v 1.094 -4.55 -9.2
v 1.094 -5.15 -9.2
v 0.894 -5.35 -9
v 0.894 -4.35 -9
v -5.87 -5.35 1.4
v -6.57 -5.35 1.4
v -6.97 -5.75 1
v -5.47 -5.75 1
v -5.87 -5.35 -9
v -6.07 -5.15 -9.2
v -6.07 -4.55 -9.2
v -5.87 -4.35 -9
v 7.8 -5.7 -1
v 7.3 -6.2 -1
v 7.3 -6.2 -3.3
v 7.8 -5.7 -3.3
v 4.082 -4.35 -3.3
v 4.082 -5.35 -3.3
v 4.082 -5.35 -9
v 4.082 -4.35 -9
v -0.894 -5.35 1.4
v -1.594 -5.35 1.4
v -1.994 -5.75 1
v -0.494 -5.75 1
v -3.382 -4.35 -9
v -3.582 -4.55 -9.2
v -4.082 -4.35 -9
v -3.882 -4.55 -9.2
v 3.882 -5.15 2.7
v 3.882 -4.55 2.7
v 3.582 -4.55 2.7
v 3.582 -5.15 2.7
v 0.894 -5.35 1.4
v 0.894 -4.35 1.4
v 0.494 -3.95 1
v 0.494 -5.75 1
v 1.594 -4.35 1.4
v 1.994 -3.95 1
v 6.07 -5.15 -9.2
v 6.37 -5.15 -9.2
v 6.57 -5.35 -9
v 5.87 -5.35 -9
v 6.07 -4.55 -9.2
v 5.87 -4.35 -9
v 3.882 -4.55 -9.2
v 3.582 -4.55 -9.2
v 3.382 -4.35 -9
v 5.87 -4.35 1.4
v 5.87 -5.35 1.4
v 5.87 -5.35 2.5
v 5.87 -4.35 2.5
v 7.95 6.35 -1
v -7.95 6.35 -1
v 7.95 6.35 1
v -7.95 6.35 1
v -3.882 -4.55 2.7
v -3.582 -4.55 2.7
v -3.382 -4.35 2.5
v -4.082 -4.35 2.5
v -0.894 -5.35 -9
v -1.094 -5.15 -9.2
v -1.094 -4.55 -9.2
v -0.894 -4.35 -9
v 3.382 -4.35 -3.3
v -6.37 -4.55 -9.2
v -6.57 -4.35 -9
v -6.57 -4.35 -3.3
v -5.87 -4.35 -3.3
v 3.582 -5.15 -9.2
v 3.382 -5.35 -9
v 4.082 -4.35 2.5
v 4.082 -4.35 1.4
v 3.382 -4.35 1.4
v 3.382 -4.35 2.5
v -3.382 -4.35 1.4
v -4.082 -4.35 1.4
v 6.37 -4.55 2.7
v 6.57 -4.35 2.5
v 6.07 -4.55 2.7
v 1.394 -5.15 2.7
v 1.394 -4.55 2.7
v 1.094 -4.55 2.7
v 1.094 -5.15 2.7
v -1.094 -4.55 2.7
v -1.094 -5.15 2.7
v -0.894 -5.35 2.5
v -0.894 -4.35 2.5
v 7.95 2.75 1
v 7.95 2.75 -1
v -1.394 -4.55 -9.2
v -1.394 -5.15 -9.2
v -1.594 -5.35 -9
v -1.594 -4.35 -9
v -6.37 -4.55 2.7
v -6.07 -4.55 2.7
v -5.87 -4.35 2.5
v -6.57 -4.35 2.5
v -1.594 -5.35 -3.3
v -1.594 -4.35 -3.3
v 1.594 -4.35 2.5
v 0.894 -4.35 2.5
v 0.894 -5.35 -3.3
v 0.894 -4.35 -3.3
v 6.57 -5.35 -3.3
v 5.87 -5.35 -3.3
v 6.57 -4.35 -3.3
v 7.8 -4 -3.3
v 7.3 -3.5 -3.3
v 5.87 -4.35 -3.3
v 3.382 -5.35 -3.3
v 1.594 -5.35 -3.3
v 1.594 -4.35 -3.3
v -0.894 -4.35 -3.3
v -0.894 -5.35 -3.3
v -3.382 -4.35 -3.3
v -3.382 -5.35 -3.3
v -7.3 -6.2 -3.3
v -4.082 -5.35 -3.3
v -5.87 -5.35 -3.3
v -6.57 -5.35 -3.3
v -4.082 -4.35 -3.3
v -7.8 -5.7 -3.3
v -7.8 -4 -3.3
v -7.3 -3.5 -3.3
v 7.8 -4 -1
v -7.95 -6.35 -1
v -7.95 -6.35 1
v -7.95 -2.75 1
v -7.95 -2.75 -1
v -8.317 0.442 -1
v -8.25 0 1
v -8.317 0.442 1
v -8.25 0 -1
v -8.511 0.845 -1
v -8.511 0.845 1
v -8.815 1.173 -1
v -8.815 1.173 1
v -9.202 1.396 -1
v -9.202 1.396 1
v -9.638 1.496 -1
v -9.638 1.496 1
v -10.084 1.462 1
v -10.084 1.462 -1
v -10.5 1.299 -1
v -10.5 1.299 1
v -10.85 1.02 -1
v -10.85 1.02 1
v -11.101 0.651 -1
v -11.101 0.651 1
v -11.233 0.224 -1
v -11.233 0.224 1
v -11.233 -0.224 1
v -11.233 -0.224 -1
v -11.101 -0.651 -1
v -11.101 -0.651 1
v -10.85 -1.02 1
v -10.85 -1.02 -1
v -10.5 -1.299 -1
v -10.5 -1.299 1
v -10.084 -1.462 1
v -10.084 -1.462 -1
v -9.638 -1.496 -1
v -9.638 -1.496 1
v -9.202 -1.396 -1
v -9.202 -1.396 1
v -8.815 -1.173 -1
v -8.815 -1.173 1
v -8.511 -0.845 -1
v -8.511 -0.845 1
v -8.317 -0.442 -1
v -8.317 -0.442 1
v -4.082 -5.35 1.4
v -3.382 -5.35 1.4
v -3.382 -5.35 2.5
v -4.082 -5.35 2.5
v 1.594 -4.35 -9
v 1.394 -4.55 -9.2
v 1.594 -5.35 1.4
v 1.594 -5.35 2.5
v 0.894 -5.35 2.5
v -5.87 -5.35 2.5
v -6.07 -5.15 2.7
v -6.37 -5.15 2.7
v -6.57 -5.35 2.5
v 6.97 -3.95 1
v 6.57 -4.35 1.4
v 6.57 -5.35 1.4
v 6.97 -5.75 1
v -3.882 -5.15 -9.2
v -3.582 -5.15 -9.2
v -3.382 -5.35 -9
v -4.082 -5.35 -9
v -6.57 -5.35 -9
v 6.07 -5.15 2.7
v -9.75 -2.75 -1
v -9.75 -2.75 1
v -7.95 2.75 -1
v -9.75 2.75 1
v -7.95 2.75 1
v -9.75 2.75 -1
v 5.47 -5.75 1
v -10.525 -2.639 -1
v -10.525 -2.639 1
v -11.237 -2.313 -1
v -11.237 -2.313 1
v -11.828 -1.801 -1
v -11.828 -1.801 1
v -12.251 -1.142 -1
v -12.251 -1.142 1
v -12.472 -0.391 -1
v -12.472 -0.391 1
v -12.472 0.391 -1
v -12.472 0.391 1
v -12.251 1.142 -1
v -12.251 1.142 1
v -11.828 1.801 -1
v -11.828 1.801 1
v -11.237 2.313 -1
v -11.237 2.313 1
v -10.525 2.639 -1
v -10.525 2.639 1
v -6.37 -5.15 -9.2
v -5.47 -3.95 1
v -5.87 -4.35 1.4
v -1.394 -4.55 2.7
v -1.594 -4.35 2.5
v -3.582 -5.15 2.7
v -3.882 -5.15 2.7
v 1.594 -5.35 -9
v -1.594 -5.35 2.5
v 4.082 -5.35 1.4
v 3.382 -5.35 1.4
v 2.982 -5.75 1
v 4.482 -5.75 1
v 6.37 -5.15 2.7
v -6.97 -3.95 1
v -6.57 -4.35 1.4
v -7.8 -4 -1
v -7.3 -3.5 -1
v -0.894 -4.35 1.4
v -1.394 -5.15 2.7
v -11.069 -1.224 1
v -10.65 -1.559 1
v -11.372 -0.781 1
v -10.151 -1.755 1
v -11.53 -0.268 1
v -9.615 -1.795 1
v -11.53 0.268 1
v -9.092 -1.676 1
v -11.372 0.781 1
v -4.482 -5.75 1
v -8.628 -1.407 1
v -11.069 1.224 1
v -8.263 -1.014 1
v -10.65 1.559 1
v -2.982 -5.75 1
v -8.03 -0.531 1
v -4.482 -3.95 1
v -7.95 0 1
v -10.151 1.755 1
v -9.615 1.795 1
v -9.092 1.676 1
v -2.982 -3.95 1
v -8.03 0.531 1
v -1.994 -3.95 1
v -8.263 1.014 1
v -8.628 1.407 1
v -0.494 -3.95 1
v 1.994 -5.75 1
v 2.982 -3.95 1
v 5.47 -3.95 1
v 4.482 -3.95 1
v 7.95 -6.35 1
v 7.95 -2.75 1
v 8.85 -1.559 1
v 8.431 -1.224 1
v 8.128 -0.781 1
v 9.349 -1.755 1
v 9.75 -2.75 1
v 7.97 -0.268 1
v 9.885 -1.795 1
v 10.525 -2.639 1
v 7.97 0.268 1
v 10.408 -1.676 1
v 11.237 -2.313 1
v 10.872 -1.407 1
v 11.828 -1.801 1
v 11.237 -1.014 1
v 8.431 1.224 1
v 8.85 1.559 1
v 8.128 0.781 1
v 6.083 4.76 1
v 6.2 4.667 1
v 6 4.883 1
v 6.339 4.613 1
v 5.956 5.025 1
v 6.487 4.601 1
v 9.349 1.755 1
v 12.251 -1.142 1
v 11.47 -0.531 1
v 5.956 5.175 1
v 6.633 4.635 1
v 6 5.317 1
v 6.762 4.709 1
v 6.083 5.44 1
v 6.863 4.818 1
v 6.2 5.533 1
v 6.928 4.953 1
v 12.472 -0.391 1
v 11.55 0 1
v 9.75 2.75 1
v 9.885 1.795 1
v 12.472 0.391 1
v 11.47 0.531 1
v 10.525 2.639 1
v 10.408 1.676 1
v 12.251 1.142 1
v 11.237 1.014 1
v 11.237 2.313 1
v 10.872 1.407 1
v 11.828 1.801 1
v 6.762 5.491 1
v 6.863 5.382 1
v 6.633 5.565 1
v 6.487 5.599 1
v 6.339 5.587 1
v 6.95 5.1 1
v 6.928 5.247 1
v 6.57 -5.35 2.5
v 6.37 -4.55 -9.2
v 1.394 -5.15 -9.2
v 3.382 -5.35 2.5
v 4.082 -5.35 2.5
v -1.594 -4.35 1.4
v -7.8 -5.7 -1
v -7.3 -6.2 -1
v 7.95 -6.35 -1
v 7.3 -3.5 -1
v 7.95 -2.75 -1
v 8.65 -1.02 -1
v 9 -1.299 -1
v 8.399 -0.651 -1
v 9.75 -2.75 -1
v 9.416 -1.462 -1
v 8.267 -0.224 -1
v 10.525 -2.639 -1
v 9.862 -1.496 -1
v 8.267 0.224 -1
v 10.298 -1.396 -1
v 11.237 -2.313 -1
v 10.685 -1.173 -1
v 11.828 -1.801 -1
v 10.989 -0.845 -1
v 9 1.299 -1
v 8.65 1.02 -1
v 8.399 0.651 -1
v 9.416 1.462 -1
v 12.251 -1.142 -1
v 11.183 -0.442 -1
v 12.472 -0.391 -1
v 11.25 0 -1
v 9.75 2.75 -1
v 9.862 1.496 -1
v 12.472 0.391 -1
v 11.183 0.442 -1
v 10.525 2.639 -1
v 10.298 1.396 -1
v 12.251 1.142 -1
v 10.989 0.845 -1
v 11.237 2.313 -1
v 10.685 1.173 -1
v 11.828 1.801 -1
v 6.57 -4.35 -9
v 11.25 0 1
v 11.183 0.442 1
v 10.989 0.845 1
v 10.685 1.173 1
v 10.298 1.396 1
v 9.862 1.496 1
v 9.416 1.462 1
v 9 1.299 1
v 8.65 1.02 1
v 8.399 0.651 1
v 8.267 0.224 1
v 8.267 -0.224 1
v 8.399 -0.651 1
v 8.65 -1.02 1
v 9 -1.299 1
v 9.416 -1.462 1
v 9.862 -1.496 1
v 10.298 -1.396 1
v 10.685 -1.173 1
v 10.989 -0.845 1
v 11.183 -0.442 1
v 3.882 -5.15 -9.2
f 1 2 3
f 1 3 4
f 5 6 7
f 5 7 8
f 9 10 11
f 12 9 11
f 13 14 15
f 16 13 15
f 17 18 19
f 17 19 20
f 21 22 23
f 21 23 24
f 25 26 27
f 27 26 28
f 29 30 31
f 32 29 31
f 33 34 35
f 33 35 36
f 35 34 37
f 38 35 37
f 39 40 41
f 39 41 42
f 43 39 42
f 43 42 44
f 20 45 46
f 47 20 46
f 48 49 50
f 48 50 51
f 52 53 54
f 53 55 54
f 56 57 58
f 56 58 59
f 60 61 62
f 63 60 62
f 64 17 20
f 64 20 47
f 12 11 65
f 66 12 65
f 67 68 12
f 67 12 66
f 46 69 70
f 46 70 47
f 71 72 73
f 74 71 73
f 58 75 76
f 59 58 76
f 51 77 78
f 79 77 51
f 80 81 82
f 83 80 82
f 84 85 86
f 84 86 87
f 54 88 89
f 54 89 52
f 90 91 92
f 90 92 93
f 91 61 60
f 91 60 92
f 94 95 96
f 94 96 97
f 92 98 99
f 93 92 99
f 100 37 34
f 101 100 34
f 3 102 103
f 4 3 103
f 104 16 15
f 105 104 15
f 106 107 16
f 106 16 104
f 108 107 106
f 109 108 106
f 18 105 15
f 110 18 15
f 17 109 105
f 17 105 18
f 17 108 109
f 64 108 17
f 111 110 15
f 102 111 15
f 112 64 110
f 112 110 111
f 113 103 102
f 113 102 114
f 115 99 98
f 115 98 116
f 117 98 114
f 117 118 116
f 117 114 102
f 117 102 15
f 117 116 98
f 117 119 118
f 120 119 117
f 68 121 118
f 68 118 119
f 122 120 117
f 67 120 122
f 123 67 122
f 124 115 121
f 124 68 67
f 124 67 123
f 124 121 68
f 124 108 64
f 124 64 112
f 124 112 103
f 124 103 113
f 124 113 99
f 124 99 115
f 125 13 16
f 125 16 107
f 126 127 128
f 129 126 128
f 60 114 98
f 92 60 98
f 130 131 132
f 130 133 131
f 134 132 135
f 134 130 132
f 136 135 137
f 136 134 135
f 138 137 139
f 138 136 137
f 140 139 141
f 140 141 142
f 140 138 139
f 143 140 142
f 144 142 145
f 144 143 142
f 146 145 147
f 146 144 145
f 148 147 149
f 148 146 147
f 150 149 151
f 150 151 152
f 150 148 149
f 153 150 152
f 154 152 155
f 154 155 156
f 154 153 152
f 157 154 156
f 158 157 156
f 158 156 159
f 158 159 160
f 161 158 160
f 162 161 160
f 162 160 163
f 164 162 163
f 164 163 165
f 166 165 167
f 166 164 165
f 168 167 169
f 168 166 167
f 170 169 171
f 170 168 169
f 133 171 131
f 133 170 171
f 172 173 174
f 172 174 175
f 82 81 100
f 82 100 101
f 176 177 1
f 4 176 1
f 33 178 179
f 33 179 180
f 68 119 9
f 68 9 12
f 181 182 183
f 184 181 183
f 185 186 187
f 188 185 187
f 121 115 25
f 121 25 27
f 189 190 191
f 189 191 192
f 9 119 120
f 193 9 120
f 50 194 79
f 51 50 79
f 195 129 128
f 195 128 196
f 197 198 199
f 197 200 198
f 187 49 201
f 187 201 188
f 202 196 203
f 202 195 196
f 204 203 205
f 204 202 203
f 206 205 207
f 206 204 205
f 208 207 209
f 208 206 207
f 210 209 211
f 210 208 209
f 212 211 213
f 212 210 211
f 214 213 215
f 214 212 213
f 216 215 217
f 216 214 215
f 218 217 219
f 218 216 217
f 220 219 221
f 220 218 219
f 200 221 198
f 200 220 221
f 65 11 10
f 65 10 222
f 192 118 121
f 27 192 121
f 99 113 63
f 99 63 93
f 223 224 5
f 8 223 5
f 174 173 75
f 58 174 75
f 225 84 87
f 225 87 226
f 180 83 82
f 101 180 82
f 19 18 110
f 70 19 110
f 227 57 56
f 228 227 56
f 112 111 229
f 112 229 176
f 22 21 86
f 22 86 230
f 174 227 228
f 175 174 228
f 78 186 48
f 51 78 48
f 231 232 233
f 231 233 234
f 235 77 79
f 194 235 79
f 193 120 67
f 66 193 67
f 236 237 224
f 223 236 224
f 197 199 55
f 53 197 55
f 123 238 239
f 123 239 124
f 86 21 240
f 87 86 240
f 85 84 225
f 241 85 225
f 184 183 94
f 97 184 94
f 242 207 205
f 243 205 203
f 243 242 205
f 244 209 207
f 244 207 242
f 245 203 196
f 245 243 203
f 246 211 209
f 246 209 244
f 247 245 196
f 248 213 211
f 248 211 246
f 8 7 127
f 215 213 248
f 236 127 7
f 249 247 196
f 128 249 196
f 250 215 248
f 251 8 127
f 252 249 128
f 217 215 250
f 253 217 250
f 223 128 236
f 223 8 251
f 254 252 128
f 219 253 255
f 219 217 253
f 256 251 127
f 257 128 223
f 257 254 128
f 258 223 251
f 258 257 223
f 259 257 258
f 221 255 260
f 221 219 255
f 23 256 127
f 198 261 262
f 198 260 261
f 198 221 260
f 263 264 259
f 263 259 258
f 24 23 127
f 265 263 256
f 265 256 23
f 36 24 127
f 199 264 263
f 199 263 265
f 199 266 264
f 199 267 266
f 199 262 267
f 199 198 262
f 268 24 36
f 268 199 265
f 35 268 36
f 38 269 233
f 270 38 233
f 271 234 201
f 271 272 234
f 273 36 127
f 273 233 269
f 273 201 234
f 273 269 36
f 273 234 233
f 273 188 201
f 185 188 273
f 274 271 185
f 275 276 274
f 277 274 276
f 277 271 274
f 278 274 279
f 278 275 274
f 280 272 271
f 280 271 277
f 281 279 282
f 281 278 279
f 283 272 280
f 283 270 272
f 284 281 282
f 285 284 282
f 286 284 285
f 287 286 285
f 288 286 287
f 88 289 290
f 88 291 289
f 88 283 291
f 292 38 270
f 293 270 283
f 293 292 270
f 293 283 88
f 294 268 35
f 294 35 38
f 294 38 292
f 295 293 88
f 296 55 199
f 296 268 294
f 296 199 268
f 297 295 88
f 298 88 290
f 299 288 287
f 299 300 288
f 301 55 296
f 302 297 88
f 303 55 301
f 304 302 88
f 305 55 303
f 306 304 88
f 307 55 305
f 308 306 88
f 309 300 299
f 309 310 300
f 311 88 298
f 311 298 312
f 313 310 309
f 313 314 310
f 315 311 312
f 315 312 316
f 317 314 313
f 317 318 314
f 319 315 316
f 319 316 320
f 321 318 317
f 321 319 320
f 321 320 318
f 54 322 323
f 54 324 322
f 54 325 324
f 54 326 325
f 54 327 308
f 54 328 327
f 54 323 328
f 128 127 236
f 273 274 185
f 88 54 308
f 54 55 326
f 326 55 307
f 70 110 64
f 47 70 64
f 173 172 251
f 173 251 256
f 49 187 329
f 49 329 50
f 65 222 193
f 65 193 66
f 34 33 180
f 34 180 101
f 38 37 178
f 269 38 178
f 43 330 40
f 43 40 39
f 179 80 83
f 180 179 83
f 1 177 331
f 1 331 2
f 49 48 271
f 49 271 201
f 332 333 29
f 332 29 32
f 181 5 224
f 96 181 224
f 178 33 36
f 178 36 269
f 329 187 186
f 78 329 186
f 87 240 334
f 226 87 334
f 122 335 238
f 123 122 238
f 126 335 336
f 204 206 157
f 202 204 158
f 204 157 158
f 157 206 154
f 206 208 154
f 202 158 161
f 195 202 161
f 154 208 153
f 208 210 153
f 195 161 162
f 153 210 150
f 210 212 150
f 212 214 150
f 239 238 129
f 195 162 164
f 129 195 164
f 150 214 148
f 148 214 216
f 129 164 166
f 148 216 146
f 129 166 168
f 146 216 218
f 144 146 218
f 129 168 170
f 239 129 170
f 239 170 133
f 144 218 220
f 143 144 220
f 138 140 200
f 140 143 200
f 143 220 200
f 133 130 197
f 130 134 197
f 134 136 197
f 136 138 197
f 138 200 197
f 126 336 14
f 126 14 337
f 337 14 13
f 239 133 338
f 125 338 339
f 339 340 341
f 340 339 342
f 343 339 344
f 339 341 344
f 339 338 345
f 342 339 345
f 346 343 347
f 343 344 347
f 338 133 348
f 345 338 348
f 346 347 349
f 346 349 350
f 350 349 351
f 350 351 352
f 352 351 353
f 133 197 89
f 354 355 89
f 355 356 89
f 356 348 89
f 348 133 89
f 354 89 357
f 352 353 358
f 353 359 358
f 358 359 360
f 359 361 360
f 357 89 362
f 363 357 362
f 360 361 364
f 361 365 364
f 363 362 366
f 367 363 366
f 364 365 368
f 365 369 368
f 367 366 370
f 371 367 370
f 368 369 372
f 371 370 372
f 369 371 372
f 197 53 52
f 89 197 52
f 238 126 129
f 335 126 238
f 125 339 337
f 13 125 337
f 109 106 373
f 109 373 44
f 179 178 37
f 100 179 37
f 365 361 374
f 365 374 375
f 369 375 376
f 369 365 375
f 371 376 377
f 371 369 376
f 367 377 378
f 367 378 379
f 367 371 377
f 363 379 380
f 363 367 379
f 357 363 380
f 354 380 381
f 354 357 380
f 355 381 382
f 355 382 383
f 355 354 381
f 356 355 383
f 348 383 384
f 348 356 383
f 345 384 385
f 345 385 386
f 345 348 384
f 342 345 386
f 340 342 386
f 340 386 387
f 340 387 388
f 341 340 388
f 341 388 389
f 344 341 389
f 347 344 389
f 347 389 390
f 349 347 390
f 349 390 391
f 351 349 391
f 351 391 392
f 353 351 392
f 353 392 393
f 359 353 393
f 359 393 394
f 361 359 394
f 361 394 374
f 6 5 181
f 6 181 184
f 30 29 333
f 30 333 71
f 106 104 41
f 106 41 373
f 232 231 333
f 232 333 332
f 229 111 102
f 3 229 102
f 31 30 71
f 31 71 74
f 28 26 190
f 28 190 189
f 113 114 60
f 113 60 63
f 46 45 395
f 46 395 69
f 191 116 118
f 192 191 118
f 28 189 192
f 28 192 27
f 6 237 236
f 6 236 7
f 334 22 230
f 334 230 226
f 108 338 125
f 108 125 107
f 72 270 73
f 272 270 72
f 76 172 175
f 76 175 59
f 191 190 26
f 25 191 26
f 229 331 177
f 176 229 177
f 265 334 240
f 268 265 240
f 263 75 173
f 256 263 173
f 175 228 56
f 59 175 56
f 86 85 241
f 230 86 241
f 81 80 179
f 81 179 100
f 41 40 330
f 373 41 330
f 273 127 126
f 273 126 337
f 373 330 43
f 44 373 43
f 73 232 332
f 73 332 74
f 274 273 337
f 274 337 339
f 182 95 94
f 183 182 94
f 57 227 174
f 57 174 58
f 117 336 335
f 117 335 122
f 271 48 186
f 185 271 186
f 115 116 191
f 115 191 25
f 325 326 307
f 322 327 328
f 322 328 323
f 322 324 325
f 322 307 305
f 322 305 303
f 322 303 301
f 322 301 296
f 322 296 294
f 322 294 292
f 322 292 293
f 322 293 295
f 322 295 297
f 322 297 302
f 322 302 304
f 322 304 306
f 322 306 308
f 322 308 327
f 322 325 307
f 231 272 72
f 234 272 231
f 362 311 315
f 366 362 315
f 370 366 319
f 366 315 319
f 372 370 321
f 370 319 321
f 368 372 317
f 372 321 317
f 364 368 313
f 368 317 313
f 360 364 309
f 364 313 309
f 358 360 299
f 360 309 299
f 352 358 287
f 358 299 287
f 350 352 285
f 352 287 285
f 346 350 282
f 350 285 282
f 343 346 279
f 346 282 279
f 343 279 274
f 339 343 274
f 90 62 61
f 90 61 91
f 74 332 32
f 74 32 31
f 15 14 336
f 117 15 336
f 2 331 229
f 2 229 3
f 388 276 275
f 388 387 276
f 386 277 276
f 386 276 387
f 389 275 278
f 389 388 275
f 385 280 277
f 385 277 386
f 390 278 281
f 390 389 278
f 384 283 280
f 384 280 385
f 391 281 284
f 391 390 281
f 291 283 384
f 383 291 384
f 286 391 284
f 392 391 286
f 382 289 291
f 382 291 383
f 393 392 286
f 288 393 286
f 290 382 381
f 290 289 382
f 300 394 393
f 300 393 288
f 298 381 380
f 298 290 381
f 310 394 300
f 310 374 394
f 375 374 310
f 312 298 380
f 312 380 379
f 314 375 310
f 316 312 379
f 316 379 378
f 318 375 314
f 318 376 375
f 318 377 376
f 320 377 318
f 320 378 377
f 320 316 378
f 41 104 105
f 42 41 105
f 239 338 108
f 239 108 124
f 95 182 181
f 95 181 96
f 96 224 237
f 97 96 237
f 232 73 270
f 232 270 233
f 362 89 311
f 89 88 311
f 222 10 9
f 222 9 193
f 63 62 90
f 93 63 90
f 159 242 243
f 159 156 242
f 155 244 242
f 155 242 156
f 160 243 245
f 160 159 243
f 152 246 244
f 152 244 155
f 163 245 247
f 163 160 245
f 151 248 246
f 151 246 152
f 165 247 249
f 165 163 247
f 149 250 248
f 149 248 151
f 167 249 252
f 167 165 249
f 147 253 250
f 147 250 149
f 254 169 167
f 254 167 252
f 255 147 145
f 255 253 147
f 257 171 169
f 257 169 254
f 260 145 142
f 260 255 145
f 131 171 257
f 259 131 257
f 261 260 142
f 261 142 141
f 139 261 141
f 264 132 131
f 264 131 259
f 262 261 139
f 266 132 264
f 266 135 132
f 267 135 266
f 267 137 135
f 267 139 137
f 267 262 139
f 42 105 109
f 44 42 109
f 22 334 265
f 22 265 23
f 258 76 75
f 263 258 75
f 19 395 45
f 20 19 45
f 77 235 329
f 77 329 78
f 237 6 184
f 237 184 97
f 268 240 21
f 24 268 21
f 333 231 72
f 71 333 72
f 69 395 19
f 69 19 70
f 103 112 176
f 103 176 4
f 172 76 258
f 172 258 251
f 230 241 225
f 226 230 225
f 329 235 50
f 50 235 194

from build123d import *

# Parameters (mm, degrees)
SKETCH1_W                = 15.9
SKETCH1_H                = 12.7
BOSS_EXTRUDE1_DEPTH      = 1
SKETCH2_R                = 1.5
BOSS_EXTRUDE2_DEPTH      = 1
SKETCH3_W                = 15.6
SKETCH3_H                = 2.7
BOSS_EXTRUDE3_DEPTH      = 2.3
CHAMFER1_SIZE            = 0.5
SKETCH4_W                = 0.7
SKETCH4_H                = 1
BOSS_EXTRUDE4_DEPTH      = 5.9
BOSS_EXTRUDE4_DEPTH_BACK = 6
CHAMFER2_SIZE            = 0.2
CHAMFER3_SIZE            = 0.4
SKETCH5_R                = 1.8
SKETCH5_R_2              = 1.5
SKETCH5_R_3              = 0.5
BOSS_EXTRUDE5_DEPTH      = 0.0001


with BuildPart() as part:
    # Sketch1 → Boss-Extrude1 (new body, symmetric)
    with BuildSketch(Plane.XY):
        Rectangle(SKETCH1_W, SKETCH1_H)
    extrude(amount=BOSS_EXTRUDE1_DEPTH, both=True)

    # Sketch2 → Boss-Extrude2 (add, symmetric)
    with BuildSketch(Plane.XY):
        with BuildLine():
            Line((-9.75, 2.75), (-7.95, 2.75))
            Line((-7.95, 2.75), (-7.95, -2.75))
            Line((-7.95, -2.75), (-9.75, -2.75))
            ThreePointArc((-9.75, -2.75), (-12.5, 0), (-9.75, 2.75))
        make_face()
        with Locations((-9.75, 0)):
            Circle(SKETCH2_R, mode=Mode.SUBTRACT)
        with BuildLine():
            Line((9.75, -2.75), (7.95, -2.75))
            Line((7.95, -2.75), (7.95, 2.75))
            Line((7.95, 2.75), (9.75, 2.75))
            ThreePointArc((9.75, 2.75), (12.5, 0), (9.75, -2.75))
        make_face()
        with Locations((9.75, 0)):
            Circle(SKETCH2_R, mode=Mode.SUBTRACT)
    extrude(amount=BOSS_EXTRUDE2_DEPTH, both=True)

    # Sketch3 → Boss-Extrude3 (add)
    with BuildSketch(Plane(origin=(0, 0, -1), x_dir=(-1, 0, 0), z_dir=(0, 0, -1))):
        with Locations((0, -4.85)):
            Rectangle(SKETCH3_W, SKETCH3_H)
    extrude(amount=BOSS_EXTRUDE3_DEPTH)

    # Chamfer1
    chamfer1_edges = [part.edges().sort_by_distance(p)[0] for p in [
        (7.8, -3.5, -2.15),
        (7.8, -6.2, -2.15),
        (-7.8, -6.2, -2.15),
        (-7.8, -3.5, -2.15),
    ]]
    chamfer(chamfer1_edges, length=CHAMFER1_SIZE)

    # Sketch4 → Boss-Extrude4 (add, two sides)
    with BuildSketch(Plane(origin=(0, 0, -3.3), x_dir=(-1, 0, 0), z_dir=(0, 0, -1))) as boss_extrude4_sk:
        with Locations((-3.732, -4.85)):
            Rectangle(SKETCH4_W, SKETCH4_H)
        with Locations((-6.22, -4.85)):
            Rectangle(SKETCH4_W, SKETCH4_H)
        with Locations((-1.244, -4.85)):
            Rectangle(SKETCH4_W, SKETCH4_H)
        with Locations((1.244, -4.85)):
            Rectangle(SKETCH4_W, SKETCH4_H)
        with Locations((3.732, -4.85)):
            Rectangle(SKETCH4_W, SKETCH4_H)
        with Locations((6.22, -4.85)):
            Rectangle(SKETCH4_W, SKETCH4_H)
    extrude(amount=BOSS_EXTRUDE4_DEPTH)
    extrude(boss_extrude4_sk.sketch, amount=-BOSS_EXTRUDE4_DEPTH_BACK)

    # Chamfer2
    chamfer2_edges = [part.edges().sort_by_distance(p)[0] for p in [
        (4.082, -4.85, 2.7),
        (3.732, -4.35, 2.7),
        (3.382, -4.85, 2.7),
        (3.732, -5.35, 2.7),
        (4.082, -4.85, -9.2),
        (3.732, -5.35, -9.2),
        (3.382, -4.85, -9.2),
        (3.732, -4.35, -9.2),
        (1.594, -4.85, 2.7),
        (1.244, -4.35, 2.7),
        (0.894, -4.85, 2.7),
        (1.244, -5.35, 2.7),
        (1.594, -4.85, -9.2),
        (1.244, -5.35, -9.2),
        (0.894, -4.85, -9.2),
        (1.244, -4.35, -9.2),
        (-0.894, -4.85, 2.7),
        (-1.244, -4.35, 2.7),
        (-1.594, -4.85, 2.7),
        (-1.244, -5.35, 2.7),
        (-0.894, -4.85, -9.2),
        (-1.244, -5.35, -9.2),
        (-1.594, -4.85, -9.2),
        (-1.244, -4.35, -9.2),
        (-3.382, -4.85, 2.7),
        (-3.732, -4.35, 2.7),
        (-4.082, -4.85, 2.7),
        (-3.732, -5.35, 2.7),
        (-3.382, -4.85, -9.2),
        (-3.732, -5.35, -9.2),
        (-4.082, -4.85, -9.2),
        (-3.732, -4.35, -9.2),
        (-5.87, -4.85, 2.7),
        (-6.22, -4.35, 2.7),
        (-6.57, -4.85, 2.7),
        (-6.22, -5.35, 2.7),
        (-5.87, -4.85, -9.2),
        (-6.22, -5.35, -9.2),
        (-6.57, -4.85, -9.2),
        (-6.22, -4.35, -9.2),
        (6.57, -4.85, 2.7),
        (6.22, -4.35, 2.7),
        (5.87, -4.85, 2.7),
        (6.22, -5.35, 2.7),
        (6.57, -4.85, -9.2),
        (6.22, -5.35, -9.2),
        (5.87, -4.85, -9.2),
        (6.22, -4.35, -9.2),
    ]]
    chamfer(chamfer2_edges, length=CHAMFER2_SIZE)

    # Chamfer3
    chamfer3_edges = [part.edges().sort_by_distance(p)[0] for p in [
        (4.082, -4.85, 1),
        (3.732, -4.35, 1),
        (3.382, -4.85, 1),
        (3.732, -5.35, 1),
        (1.594, -4.85, 1),
        (1.244, -4.35, 1),
        (0.894, -4.85, 1),
        (1.244, -5.35, 1),
        (-0.894, -4.85, 1),
        (-1.244, -4.35, 1),
        (-1.594, -4.85, 1),
        (-1.244, -5.35, 1),
        (-3.382, -4.85, 1),
        (-3.732, -4.35, 1),
        (-4.082, -4.85, 1),
        (-3.732, -5.35, 1),
        (-5.87, -4.85, 1),
        (-6.22, -4.35, 1),
        (-6.57, -4.85, 1),
        (-6.22, -5.35, 1),
        (6.57, -4.85, 1),
        (6.22, -4.35, 1),
        (5.87, -4.85, 1),
        (6.22, -5.35, 1),
    ]]
    chamfer(chamfer3_edges, length=CHAMFER3_SIZE)

    # Sketch5 → Boss-Extrude5 (add)
    with BuildSketch(Plane.XY.offset(1)):
        with Locations((-9.75, 0)):
            Circle(SKETCH5_R)
        with Locations((-9.75, 0)):
            Circle(SKETCH5_R_2, mode=Mode.SUBTRACT)
        with Locations((9.75, 0)):
            Circle(SKETCH5_R)
        with Locations((9.75, 0)):
            Circle(SKETCH5_R_2, mode=Mode.SUBTRACT)
        with Locations((6.45, 5.1)):
            Circle(SKETCH5_R_3)
    extrude(amount=BOSS_EXTRUDE5_DEPTH)


solid = part.part
